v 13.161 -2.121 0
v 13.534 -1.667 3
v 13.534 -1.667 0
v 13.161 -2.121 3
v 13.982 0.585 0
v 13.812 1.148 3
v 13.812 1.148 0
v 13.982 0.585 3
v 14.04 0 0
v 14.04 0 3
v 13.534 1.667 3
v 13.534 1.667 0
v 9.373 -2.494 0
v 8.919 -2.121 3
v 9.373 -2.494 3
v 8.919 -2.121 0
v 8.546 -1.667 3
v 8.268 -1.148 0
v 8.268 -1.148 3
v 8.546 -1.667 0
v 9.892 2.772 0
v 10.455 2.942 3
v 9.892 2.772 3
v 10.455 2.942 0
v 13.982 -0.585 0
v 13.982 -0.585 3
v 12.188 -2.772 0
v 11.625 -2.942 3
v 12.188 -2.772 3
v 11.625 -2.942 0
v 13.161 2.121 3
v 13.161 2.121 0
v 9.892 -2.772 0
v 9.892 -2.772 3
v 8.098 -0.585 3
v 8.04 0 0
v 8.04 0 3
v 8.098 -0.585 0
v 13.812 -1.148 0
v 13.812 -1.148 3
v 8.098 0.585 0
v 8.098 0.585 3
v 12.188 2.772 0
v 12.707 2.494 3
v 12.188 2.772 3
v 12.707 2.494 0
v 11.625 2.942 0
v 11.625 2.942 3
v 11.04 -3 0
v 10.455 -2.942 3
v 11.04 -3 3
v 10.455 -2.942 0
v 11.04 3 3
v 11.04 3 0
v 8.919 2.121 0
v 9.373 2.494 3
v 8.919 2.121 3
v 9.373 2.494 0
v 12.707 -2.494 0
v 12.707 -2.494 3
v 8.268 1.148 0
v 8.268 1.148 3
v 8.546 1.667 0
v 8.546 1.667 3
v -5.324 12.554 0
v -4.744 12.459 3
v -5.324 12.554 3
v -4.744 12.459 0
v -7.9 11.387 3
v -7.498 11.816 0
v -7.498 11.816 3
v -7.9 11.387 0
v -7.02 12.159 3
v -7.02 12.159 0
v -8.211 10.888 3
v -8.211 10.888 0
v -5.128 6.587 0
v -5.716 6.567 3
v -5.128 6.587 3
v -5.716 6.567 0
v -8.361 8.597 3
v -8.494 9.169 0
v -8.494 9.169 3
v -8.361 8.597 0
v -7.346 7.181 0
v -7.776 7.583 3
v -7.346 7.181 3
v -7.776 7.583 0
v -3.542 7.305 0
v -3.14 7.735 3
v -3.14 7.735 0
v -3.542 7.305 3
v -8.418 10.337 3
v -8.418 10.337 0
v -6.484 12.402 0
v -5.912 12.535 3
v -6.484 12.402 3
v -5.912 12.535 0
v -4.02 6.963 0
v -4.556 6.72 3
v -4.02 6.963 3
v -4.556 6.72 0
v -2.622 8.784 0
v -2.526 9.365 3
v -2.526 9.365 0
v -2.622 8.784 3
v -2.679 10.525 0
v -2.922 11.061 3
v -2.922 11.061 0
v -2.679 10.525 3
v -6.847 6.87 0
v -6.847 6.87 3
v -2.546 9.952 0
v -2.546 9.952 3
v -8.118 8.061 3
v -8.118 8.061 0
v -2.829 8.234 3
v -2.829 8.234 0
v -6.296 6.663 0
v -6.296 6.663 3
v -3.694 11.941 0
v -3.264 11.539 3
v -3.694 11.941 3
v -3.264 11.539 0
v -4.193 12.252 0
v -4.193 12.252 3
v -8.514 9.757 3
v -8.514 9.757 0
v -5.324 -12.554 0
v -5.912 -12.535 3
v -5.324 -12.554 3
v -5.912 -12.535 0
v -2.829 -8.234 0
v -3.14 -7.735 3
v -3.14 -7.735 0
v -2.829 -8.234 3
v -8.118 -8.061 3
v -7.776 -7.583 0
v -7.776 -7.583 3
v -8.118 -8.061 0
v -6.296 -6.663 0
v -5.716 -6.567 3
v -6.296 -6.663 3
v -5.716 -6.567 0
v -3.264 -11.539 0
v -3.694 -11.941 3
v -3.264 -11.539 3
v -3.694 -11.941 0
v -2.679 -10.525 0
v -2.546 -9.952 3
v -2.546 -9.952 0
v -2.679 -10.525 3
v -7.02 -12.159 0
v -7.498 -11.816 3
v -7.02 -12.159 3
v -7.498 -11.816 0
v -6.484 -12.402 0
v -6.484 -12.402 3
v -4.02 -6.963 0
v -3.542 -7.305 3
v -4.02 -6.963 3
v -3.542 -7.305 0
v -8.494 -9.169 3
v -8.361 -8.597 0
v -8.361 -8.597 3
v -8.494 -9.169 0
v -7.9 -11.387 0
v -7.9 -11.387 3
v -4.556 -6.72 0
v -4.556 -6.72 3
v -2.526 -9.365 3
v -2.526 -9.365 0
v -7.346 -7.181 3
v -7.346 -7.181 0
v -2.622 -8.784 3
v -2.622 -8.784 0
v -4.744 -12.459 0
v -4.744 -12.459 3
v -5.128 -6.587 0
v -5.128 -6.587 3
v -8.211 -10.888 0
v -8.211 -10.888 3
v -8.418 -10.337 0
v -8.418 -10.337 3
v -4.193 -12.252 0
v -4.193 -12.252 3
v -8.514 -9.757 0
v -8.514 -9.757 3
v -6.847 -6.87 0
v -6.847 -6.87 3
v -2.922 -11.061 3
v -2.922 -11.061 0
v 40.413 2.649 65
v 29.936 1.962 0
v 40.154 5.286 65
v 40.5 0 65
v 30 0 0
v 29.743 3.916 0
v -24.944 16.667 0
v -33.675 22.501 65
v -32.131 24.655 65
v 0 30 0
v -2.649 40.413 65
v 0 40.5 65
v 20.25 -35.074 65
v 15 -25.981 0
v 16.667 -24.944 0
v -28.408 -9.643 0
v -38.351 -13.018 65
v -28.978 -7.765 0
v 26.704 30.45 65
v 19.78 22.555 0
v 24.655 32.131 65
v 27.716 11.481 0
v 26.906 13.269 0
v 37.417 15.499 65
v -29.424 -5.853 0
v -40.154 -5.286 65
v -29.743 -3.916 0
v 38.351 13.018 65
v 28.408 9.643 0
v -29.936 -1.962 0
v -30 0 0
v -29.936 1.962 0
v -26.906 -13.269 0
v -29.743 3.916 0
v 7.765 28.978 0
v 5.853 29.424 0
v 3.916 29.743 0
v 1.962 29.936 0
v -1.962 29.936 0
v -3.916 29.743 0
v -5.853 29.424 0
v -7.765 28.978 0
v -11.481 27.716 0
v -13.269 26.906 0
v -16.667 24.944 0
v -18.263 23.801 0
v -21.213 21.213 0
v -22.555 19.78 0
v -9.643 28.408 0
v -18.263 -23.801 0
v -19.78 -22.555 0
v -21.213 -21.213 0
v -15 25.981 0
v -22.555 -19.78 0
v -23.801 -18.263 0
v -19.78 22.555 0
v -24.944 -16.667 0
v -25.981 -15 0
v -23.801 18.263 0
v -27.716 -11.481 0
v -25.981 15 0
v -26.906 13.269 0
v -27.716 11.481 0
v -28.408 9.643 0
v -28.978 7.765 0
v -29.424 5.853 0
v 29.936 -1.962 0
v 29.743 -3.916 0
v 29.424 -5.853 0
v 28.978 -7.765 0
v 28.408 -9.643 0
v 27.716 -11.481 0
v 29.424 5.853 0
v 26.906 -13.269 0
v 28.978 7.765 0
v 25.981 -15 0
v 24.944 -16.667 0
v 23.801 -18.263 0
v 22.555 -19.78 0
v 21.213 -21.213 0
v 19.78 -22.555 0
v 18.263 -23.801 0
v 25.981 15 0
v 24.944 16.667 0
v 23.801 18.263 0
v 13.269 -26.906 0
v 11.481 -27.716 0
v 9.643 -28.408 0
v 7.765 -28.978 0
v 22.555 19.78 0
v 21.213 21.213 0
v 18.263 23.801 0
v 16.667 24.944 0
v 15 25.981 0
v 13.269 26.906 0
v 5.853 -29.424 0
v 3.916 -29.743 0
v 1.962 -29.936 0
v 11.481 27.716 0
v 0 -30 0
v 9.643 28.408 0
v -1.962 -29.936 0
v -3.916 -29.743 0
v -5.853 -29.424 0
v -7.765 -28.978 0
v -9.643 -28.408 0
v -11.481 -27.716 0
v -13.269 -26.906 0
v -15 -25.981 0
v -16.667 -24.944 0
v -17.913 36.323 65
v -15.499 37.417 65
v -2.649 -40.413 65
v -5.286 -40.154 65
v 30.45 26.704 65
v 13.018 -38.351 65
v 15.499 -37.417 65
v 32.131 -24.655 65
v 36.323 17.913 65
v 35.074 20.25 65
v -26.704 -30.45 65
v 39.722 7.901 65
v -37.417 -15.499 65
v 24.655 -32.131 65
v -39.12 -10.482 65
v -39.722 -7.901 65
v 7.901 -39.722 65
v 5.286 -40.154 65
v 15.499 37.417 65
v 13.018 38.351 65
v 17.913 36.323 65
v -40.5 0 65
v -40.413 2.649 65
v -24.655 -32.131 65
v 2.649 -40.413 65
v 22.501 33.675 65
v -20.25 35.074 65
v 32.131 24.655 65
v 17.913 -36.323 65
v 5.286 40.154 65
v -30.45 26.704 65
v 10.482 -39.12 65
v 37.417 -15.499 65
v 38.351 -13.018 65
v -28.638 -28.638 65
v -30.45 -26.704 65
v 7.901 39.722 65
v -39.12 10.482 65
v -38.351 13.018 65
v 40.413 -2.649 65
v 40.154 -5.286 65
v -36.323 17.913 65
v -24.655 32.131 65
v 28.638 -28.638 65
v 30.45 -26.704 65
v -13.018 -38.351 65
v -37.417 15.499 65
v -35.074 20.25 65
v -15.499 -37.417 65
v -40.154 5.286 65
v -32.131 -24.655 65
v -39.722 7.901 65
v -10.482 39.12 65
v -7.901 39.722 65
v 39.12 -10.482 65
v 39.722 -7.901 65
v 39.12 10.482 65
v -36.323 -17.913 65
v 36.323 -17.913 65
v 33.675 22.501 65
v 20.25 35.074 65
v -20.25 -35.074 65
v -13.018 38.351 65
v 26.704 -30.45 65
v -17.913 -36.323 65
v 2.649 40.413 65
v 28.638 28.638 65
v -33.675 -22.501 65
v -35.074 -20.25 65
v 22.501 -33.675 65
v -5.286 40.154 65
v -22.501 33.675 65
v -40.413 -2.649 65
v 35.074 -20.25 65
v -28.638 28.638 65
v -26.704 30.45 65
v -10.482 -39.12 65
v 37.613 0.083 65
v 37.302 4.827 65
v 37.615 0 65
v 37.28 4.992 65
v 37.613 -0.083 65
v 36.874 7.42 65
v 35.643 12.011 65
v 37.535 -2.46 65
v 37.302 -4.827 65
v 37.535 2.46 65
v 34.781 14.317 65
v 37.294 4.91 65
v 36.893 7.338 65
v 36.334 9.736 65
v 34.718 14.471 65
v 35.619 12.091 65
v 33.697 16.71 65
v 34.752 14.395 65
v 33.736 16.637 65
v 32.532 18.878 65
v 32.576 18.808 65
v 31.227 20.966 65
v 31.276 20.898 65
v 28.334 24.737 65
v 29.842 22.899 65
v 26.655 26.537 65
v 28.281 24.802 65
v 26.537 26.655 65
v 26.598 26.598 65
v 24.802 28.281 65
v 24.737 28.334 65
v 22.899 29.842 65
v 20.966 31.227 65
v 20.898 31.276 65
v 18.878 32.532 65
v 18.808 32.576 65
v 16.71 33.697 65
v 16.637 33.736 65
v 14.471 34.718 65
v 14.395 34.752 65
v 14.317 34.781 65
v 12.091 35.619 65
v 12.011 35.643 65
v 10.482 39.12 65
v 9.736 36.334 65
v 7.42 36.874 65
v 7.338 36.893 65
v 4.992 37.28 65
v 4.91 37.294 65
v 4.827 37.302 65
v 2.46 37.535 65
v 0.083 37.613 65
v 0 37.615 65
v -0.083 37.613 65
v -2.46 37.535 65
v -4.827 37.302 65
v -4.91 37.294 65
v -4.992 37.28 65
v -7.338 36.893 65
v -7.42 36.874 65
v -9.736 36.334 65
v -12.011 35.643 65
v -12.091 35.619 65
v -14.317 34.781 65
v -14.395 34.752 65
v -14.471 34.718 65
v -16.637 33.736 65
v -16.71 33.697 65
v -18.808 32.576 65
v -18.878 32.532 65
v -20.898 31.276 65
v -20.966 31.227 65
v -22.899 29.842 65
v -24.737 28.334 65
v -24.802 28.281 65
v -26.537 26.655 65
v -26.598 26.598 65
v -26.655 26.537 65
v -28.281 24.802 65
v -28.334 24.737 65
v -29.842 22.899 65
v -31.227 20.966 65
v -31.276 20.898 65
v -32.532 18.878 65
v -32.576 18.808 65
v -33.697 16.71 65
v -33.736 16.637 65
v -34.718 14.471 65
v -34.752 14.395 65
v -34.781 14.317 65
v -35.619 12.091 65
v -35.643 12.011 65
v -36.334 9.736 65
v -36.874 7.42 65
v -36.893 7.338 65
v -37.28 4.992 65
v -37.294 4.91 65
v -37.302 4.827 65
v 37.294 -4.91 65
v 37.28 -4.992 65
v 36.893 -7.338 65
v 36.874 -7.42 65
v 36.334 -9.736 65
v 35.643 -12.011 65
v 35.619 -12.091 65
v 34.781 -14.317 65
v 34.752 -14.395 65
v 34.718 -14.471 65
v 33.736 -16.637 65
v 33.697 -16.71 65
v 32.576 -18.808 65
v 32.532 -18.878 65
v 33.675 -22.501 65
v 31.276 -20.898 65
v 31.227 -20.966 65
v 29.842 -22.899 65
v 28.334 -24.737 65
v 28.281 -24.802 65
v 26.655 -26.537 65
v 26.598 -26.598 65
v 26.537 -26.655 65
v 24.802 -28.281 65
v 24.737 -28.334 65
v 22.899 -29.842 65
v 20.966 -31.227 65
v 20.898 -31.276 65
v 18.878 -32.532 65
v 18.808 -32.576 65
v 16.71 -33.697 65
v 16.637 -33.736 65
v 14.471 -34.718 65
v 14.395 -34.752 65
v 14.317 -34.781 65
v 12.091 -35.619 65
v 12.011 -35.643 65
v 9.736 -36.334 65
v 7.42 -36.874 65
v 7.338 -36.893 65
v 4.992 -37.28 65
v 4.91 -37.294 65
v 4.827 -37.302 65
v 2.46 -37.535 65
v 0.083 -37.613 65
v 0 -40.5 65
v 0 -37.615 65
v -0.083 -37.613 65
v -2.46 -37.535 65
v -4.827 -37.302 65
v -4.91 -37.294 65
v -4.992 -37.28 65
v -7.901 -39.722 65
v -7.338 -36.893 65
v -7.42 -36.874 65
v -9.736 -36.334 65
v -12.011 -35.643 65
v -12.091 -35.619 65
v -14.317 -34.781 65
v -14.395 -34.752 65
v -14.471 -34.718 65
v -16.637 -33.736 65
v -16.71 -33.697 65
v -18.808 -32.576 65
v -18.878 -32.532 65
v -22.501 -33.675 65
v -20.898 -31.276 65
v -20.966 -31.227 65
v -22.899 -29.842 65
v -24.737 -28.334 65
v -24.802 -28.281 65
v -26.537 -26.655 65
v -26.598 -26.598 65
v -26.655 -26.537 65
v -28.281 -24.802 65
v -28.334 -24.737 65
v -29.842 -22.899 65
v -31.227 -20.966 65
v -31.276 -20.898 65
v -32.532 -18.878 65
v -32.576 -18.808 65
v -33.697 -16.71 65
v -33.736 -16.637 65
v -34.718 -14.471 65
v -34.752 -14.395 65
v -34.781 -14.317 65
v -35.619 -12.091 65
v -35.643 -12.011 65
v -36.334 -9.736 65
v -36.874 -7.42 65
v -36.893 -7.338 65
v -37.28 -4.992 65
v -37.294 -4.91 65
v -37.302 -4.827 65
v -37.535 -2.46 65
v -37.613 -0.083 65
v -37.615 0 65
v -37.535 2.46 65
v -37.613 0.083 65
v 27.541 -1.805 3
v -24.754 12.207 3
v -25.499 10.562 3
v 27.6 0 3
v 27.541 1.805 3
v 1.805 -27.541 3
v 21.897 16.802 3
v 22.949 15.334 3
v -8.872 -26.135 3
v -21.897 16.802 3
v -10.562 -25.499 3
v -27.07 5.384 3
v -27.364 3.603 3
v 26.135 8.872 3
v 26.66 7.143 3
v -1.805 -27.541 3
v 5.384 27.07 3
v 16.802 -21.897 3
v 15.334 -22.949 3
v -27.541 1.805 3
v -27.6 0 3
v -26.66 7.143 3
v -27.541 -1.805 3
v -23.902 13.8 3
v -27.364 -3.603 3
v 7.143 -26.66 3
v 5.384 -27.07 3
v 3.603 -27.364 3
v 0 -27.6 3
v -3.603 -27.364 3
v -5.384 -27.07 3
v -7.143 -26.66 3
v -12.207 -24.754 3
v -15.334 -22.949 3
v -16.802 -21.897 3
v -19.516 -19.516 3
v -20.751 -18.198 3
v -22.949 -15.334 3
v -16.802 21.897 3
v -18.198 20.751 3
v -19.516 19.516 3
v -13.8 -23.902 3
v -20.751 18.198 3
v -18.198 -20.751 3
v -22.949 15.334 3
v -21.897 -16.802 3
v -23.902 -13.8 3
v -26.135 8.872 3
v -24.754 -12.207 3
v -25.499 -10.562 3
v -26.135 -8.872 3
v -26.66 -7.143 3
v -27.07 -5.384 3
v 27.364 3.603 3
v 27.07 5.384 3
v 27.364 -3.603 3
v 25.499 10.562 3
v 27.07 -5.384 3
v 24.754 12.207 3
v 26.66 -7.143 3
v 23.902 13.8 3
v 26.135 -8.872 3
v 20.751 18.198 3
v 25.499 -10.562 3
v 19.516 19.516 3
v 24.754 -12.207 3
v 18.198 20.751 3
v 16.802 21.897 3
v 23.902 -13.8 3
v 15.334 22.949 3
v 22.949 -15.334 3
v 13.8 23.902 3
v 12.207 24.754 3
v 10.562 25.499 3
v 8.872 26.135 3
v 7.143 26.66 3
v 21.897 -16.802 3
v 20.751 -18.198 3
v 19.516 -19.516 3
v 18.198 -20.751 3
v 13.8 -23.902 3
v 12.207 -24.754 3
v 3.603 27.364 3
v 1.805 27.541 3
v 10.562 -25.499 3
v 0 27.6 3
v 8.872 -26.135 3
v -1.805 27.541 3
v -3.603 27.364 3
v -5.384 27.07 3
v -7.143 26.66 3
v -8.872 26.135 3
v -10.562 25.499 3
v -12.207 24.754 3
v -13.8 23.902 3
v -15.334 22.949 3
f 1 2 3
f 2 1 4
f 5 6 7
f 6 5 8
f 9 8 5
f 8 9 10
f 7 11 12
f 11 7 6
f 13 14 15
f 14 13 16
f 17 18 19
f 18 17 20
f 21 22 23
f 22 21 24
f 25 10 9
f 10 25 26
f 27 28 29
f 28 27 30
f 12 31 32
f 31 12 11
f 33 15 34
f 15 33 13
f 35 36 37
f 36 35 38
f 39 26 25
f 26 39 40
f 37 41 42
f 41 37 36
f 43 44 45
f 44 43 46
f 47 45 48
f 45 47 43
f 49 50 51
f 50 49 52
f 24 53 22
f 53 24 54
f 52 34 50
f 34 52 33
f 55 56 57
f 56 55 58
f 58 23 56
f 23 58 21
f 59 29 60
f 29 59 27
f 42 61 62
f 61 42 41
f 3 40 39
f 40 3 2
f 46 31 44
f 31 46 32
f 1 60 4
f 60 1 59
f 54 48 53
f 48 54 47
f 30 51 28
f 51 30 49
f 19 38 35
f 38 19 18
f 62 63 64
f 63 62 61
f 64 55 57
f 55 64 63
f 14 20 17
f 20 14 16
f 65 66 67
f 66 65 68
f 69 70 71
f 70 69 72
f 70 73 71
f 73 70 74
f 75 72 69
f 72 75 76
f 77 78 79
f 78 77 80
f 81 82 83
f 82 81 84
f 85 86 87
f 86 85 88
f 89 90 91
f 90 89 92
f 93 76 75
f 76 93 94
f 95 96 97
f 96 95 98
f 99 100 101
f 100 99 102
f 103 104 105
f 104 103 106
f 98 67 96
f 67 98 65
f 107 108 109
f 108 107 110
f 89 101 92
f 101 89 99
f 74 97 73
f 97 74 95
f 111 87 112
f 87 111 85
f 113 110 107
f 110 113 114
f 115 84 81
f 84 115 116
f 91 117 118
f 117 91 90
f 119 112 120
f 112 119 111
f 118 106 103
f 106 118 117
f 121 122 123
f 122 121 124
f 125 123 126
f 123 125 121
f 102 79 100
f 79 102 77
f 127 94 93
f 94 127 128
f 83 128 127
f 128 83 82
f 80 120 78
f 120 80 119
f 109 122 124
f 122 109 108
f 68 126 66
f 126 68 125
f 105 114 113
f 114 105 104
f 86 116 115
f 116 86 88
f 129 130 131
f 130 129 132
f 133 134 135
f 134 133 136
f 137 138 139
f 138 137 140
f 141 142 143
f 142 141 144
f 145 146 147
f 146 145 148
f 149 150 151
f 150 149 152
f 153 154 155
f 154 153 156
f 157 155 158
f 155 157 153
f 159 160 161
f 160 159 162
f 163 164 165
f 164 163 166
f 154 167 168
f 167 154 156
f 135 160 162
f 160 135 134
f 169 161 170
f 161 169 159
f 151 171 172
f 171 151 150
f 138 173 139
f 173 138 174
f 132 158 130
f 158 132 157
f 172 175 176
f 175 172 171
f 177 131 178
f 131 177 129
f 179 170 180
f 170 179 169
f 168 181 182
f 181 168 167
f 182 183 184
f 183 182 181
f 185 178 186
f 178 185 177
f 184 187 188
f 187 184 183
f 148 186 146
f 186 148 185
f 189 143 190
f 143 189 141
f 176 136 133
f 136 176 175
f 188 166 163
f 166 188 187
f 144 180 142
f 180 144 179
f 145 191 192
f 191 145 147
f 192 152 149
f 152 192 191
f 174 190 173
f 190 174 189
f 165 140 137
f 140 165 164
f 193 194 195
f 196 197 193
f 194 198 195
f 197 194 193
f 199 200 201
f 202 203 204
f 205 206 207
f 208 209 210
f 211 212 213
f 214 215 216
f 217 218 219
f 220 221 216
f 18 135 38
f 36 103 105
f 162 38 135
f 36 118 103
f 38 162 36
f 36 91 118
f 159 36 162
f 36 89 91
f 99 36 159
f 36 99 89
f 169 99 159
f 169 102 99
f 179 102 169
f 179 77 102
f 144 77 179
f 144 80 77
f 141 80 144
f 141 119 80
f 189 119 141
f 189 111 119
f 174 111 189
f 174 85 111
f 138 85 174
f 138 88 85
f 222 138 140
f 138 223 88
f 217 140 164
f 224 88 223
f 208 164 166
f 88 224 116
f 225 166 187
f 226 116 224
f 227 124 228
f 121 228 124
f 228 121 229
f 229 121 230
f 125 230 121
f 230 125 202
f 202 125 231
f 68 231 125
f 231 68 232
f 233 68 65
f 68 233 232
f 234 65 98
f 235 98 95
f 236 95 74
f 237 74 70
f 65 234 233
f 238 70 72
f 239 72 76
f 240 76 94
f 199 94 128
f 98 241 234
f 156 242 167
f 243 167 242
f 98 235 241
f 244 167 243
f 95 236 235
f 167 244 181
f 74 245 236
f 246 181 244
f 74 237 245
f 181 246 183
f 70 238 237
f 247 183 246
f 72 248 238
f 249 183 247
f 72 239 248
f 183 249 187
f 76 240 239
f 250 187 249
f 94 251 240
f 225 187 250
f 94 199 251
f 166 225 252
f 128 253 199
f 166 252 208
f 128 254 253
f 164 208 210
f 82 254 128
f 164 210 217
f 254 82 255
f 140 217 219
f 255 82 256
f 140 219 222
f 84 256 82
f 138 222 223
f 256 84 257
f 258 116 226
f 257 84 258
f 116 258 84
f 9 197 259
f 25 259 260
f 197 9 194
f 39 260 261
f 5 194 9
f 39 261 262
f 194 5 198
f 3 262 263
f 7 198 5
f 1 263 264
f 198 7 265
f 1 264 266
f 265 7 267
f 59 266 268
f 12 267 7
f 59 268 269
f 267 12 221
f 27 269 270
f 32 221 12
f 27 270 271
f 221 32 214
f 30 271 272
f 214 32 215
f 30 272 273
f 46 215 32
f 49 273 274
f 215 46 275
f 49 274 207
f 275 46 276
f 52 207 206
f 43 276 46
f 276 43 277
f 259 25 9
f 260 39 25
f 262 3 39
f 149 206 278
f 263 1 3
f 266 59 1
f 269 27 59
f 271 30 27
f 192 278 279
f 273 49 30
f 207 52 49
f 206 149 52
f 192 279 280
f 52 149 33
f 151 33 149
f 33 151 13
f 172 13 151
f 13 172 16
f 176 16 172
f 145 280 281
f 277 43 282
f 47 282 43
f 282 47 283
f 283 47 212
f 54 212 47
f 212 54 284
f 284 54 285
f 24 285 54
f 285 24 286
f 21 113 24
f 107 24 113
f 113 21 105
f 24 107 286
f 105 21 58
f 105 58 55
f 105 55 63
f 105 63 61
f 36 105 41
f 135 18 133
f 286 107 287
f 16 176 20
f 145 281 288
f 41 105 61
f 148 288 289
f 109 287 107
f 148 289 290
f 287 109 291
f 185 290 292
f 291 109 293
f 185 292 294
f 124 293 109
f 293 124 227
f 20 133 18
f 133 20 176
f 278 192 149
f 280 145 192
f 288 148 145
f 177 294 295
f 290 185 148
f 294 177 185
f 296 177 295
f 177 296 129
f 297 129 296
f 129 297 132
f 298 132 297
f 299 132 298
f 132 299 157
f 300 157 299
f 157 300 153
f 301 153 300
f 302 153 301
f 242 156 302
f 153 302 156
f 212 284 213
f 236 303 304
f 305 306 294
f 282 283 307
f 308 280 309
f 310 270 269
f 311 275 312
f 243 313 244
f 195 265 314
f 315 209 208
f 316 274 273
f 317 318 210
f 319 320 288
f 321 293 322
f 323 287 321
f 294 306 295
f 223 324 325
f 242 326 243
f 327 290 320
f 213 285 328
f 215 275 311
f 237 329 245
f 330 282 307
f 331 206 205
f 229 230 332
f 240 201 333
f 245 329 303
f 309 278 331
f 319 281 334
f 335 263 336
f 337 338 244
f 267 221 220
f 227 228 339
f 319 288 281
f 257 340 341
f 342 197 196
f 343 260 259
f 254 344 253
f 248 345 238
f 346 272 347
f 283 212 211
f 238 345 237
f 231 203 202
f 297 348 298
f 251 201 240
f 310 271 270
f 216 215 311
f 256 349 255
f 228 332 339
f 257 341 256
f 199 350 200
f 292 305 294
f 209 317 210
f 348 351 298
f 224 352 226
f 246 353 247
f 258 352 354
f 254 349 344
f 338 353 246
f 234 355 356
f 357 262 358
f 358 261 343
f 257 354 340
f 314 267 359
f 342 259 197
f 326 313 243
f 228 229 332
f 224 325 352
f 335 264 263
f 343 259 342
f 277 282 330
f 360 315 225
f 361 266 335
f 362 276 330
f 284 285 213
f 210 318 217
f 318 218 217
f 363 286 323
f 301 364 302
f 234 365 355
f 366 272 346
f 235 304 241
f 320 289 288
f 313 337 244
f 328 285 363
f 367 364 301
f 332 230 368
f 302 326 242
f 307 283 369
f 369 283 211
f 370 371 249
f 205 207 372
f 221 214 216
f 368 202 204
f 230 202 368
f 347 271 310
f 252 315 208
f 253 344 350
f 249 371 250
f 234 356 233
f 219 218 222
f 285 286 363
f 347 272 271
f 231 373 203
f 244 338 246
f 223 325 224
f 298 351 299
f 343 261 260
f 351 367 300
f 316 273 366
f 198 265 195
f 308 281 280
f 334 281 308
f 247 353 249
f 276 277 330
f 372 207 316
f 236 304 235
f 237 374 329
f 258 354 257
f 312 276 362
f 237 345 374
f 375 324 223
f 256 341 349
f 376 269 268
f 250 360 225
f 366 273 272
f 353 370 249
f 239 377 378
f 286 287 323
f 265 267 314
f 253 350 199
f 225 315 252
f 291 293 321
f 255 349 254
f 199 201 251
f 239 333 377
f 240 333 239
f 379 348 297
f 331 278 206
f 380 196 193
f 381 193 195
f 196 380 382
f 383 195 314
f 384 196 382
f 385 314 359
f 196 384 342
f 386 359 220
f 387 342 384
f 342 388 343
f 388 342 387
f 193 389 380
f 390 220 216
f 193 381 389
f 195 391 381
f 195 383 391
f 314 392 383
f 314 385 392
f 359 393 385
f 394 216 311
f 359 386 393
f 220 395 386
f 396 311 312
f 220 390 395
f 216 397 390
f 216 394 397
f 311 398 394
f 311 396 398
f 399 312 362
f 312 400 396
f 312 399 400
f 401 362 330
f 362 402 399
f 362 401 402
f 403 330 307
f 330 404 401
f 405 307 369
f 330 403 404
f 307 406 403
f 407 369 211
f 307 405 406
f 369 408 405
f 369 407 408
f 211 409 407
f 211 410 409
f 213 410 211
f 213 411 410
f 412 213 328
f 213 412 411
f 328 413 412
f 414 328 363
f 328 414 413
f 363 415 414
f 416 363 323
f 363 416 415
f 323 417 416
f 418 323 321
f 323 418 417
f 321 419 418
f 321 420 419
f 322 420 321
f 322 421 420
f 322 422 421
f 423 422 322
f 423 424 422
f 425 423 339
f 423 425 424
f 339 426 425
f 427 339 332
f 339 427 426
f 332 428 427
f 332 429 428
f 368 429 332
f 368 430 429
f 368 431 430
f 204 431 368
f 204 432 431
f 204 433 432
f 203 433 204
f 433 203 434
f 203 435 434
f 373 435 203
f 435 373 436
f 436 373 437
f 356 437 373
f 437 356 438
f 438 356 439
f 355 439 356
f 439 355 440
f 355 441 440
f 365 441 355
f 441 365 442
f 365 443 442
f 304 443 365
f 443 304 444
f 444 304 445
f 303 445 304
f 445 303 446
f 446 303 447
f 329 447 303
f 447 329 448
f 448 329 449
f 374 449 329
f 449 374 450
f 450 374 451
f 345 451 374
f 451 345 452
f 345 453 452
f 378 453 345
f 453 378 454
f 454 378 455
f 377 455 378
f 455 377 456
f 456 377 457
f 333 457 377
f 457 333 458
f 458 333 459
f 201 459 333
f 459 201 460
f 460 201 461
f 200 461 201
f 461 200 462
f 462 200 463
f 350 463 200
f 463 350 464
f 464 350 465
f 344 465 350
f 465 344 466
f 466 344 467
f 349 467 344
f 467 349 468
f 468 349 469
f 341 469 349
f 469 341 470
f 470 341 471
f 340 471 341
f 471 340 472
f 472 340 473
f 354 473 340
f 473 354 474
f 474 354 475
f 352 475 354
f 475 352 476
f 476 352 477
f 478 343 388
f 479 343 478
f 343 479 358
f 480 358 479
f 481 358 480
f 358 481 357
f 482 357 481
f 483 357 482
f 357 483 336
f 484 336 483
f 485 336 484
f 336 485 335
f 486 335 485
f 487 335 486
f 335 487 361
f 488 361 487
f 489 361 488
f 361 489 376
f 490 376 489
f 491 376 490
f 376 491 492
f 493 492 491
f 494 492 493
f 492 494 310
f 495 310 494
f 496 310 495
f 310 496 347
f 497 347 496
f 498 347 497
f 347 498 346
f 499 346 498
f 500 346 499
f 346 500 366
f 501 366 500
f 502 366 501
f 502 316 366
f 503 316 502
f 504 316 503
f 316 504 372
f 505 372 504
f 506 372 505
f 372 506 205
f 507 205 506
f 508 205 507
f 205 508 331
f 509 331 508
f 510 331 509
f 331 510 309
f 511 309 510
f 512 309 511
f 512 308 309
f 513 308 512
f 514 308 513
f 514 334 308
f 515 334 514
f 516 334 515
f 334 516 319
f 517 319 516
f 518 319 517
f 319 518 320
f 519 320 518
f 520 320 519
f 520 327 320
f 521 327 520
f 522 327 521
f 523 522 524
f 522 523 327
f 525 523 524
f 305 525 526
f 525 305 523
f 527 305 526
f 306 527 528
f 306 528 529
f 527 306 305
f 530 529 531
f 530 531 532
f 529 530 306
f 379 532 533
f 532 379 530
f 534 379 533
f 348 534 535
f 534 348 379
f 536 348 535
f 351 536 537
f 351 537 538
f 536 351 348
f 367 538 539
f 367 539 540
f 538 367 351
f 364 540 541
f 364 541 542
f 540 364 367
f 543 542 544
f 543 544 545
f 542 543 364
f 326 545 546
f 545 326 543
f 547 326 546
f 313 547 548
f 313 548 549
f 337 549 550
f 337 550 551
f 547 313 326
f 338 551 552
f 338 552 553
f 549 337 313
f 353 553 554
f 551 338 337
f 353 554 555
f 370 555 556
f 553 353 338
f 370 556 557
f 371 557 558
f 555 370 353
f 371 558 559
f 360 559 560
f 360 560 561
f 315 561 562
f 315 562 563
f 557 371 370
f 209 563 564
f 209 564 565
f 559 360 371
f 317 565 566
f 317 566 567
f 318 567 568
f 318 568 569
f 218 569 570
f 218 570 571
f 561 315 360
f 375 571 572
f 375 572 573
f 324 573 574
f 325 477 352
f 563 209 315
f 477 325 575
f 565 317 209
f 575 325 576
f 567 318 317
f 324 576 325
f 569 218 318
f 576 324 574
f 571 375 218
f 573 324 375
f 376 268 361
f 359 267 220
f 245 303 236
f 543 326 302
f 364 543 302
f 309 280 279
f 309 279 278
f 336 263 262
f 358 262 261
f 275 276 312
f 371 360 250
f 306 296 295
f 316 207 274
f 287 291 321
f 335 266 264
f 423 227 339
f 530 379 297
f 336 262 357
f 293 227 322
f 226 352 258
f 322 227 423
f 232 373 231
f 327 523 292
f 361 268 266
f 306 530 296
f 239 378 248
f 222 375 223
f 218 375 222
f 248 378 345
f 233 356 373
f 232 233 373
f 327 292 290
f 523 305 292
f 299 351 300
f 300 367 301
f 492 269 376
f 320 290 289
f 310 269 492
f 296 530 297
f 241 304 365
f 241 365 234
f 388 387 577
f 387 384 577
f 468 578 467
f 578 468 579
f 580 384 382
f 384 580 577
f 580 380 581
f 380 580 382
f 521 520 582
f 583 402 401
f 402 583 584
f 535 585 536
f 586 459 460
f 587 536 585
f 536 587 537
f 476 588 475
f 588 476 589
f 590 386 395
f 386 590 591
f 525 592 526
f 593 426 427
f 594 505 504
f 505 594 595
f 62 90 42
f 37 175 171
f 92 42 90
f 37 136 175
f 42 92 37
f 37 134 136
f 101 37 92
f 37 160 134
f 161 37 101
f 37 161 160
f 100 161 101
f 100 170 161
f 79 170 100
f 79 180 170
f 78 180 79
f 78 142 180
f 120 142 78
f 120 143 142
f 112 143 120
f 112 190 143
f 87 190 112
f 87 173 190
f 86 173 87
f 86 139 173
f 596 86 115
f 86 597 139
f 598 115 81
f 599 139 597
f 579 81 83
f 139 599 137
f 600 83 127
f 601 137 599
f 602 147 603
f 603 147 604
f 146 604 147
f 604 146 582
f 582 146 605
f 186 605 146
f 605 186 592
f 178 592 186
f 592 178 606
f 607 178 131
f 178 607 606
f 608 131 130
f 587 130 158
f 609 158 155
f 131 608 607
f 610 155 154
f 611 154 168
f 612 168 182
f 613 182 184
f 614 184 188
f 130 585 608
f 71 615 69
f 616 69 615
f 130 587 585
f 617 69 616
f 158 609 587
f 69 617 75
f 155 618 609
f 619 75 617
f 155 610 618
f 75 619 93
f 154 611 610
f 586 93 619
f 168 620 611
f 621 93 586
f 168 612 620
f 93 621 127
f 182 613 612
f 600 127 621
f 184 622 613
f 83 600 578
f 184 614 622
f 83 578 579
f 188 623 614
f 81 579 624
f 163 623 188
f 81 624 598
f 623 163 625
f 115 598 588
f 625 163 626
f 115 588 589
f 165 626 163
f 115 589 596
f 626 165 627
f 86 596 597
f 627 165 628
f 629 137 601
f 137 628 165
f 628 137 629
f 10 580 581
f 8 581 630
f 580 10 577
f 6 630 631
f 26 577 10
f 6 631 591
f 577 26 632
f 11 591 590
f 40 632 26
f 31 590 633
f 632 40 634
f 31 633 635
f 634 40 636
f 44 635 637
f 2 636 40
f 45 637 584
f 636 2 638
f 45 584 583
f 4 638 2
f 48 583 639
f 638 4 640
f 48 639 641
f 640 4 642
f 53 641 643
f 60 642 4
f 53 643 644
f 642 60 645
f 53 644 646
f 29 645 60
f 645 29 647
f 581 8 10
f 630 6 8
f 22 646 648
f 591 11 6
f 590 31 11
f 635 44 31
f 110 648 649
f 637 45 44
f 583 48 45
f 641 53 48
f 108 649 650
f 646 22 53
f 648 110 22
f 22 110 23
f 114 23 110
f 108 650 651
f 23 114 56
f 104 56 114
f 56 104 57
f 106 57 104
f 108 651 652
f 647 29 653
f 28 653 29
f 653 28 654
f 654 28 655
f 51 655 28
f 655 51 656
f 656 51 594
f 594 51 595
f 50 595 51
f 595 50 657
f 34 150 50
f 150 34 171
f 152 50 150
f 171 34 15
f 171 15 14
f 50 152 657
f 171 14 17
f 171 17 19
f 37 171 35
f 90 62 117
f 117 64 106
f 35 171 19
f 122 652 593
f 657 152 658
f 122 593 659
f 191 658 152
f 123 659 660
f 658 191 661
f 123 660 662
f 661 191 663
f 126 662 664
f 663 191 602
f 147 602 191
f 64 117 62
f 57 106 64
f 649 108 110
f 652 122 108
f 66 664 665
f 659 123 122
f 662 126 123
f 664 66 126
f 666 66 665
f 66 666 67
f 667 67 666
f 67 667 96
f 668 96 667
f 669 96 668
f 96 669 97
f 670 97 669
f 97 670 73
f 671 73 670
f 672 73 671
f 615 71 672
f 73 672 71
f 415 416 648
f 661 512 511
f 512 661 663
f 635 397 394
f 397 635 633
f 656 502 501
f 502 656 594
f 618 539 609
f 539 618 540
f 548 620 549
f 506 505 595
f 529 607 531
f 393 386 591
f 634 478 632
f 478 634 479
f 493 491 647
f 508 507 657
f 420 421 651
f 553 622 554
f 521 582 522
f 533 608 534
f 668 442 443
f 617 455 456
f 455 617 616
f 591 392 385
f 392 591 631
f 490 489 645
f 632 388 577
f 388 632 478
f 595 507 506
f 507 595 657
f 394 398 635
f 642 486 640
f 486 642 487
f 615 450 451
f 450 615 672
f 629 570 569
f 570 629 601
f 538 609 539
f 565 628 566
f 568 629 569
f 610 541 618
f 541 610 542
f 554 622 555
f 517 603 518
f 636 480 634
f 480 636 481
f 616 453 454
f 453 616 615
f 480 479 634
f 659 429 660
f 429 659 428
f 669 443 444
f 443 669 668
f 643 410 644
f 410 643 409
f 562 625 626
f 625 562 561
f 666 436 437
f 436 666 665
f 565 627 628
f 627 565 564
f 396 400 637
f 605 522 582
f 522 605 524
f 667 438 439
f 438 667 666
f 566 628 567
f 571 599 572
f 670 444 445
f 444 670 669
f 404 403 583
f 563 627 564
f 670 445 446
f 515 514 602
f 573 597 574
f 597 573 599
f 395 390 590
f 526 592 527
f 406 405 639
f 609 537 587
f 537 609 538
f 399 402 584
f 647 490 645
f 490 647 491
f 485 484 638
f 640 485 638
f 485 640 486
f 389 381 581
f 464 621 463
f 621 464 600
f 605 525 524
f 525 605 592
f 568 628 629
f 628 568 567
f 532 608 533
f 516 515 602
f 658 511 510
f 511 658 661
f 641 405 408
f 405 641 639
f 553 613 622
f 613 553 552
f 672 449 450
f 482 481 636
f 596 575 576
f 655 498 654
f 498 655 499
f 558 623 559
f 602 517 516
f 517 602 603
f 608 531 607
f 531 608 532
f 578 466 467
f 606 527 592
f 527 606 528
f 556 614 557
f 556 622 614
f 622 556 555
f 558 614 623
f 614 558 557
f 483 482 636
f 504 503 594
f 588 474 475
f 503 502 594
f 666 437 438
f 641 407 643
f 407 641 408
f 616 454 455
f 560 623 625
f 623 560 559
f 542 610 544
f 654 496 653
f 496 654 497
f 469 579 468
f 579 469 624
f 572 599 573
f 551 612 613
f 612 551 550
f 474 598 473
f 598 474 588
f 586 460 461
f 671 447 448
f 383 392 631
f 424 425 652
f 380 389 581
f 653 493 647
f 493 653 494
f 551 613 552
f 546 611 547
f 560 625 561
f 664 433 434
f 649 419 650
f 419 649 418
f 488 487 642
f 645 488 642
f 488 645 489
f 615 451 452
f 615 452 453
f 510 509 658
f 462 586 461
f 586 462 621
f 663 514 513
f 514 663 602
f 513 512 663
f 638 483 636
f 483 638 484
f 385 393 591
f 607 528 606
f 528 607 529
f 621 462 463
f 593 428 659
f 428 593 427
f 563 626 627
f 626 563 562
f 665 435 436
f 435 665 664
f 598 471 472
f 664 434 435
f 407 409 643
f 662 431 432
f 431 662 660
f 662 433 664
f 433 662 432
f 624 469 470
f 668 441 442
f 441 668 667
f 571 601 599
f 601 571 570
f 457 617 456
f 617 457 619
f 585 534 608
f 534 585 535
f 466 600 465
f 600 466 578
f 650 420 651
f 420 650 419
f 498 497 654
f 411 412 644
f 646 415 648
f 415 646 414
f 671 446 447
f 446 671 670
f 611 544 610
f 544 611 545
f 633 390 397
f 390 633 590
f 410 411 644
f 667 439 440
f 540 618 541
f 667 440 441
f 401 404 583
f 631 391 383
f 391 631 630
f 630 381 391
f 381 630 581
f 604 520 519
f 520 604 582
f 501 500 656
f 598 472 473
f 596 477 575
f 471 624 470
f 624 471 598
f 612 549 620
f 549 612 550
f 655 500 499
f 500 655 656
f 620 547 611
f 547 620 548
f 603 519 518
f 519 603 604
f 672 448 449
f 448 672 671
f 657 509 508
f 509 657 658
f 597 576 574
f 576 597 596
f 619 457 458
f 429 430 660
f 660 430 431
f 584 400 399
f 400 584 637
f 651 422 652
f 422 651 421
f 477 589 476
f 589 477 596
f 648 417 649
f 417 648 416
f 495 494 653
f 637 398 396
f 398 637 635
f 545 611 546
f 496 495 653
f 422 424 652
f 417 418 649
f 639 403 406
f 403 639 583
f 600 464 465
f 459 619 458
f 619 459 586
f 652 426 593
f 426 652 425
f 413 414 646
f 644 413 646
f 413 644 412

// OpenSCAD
// mini_planter/model.scad — tapered vessel with drainage holes.
// facets >= ~96 renders round; 5-10 gives a low-poly faceted look.

bottom_d = 60;
pot_h = 65;
top_scale = 1.35;
wall = 2.4;
floor_th = 3;
facets = 96;
drain_holes = 3;
drain_d = 6;

// Inner taper chosen to keep wall thickness roughly constant top to bottom
inner_bottom_d = bottom_d - 2 * wall;
inner_scale = (bottom_d * top_scale - 2 * wall) / inner_bottom_d;

difference() {
  // outer shell
  linear_extrude(height = pot_h, scale = top_scale)
    circle(d = bottom_d, $fn = facets);

  // cavity
  translate([0, 0, floor_th])
    linear_extrude(height = pot_h, scale = inner_scale)
      circle(d = inner_bottom_d, $fn = facets);

  // drainage holes in a ring (single center hole if count == 1)
  if (drain_holes > 0) {
    ring_r = (drain_holes == 1) ? 0 : inner_bottom_d / 5;
    for (i = [0 : drain_holes - 1])
      rotate([0, 0, i * 360 / drain_holes])
        translate([ring_r, 0, -1])
          cylinder(h = floor_th + 2, d = drain_d, $fn = 32);
  }
}
